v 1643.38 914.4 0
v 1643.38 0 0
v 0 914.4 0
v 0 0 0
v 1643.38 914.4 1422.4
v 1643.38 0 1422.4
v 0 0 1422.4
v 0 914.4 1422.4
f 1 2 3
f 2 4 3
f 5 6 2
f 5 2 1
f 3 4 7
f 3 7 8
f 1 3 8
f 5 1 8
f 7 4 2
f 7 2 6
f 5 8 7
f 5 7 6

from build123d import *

# Parameters (mm, degrees)
F0_W      = 1066.8
F0_H      = 914.4
F1_DEPTH  = 1778
F1_FACE_W = 914.4
F1_FACE_H = 1778
F2_DEPTH  = 576.58
F2_FACE_W = 1643.38
F2_FACE_H = 914.4
F3_DEPTH  = 355.6


with BuildPart() as f1:
    # F0 (on Top) → F1 (new body)
    with BuildSketch(Plane.XY):
        with Locations((533.4, 457.2)):
            Rectangle(F0_W, F0_H)
    extrude(amount=F1_DEPTH)

    # F1_face (on face) → F2 (join)
    with BuildSketch(Plane(origin=(1066.8, 457.2, 889), x_dir=(0, 1, 0), z_dir=(1, 0, 0))):
        Rectangle(F1_FACE_W, F1_FACE_H)
    extrude(amount=F2_DEPTH)

    # F2_face (on face) → F3 (cut)
    with BuildSketch(Plane(origin=(821.69, 457.2, 1778), x_dir=(1, 0, 0), z_dir=(0, 0, 1))):
        Rectangle(F2_FACE_W, F2_FACE_H)
    extrude(amount=-F3_DEPTH, mode=Mode.SUBTRACT)


solid = f1.part
